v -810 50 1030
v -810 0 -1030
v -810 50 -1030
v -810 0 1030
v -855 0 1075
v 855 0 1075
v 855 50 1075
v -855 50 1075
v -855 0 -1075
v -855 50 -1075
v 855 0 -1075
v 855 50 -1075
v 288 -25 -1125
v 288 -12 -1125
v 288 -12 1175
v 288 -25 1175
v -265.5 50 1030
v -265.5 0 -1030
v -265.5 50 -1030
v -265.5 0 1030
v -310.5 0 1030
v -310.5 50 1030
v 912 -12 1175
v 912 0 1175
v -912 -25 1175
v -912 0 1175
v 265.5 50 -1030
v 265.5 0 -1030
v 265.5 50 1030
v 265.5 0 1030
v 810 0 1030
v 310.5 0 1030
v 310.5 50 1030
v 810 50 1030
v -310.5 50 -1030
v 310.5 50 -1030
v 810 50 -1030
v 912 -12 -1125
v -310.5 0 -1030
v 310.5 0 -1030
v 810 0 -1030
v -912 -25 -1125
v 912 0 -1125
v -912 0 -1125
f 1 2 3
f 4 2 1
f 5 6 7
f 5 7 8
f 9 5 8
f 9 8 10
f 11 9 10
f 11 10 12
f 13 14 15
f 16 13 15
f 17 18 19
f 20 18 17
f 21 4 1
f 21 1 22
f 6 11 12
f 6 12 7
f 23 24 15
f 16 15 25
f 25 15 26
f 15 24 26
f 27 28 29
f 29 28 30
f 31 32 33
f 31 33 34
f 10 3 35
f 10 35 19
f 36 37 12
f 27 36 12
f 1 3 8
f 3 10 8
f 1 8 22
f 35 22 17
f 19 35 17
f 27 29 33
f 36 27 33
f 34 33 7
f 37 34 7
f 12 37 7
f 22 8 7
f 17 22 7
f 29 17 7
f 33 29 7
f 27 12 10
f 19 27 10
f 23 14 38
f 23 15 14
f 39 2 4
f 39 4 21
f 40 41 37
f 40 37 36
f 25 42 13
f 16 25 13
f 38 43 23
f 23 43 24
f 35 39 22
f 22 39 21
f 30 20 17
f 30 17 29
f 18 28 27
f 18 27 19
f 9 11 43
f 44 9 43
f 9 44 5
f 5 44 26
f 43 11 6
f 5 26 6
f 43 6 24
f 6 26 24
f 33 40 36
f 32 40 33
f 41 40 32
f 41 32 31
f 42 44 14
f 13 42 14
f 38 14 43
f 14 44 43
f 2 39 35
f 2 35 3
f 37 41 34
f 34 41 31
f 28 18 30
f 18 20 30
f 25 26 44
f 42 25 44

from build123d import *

# Parameters (mm, degrees)
F0_W     = 45
F0_H     = 2060
F0_W_2   = 22.5
F1_DEPTH = 50
F0_W_3   = 499.5
F2_DEPTH = 12
F0_W_4   = 531
F3_DEPTH = 25


# Not quite as in the source:
# - a feature names something its author has since deleted; it is built from what else it names


with BuildPart() as f1:
    # F0 (on Front) → F1 (new body)
    with BuildSketch(Plane.XZ):
        with Locations((832.5, 0)):
            Rectangle(F0_W, F0_H)
        Polygon((288, -1075), (855, -1075), (855, -1030), (810, -1030), (310.5, -1030), (288, -1030), align=None)
        Polygon((-855, -1075), (288, -1075), (288, -1030), (265.5, -1030), (-265.5, -1030), (-310.5, -1030), (-810, -1030), (-855, -1030), align=None)
        with Locations((-832.5, 0)):
            Rectangle(F0_W, F0_H)
        with Locations((276.75, 0)):
            Rectangle(F0_W_2, F0_H)
        Polygon((810, 1030), (855, 1030), (855, 1075), (288, 1075), (288, 1030), (310.5, 1030), align=None)
        Polygon((265.5, 1030), (288, 1030), (288, 1075), (-855, 1075), (-855, 1030), (-810, 1030), (-310.5, 1030), (-265.5, 1030), align=None)
        with Locations((-288, 0)):
            Rectangle(F0_W, F0_H)
        with Locations((299.25, 0)):
            Rectangle(F0_W_2, F0_H)
    extrude(amount=-F1_DEPTH)

    # F0 (on Front) → F2 (join)
    with BuildSketch(Plane.XZ):
        Polygon((855, -1030), (855, -1075), (288, -1075), (288, -1125), (912, -1125), (912, 1175), (288, 1175), (288, 1075), (855, 1075), (855, 1030), align=None)
        with Locations((560.25, 0)):
            Rectangle(F0_W_3, F0_H)
        Polygon((288, -1075), (855, -1075), (855, -1030), (810, -1030), (310.5, -1030), (288, -1030), align=None)
        with Locations((832.5, 0)):
            Rectangle(F0_W, F0_H)
        Polygon((810, 1030), (855, 1030), (855, 1075), (288, 1075), (288, 1030), (310.5, 1030), align=None)
        with Locations((299.25, 0)):
            Rectangle(F0_W_2, F0_H)
    extrude(amount=F2_DEPTH)

    # F0 (on Front) → F3 (join)
    with BuildSketch(Plane.XZ):
        Polygon((288, -1125), (288, -1075), (-855, -1075), (-855, -1030), (-855, 1030), (-855, 1075), (288, 1075), (288, 1175), (-912, 1175), (-912, -1125), align=None)
        with Locations((-288, 0)):
            Rectangle(F0_W, F0_H)
        Polygon((265.5, 1030), (288, 1030), (288, 1075), (-855, 1075), (-855, 1030), (-810, 1030), (-310.5, 1030), (-265.5, 1030), align=None)
        with Locations((-832.5, 0)):
            Rectangle(F0_W, F0_H)
        with Locations((-560.25, 0)):
            Rectangle(F0_W_3, F0_H)
        Rectangle(F0_W_4, F0_H)
        Polygon((-855, -1075), (288, -1075), (288, -1030), (265.5, -1030), (-265.5, -1030), (-310.5, -1030), (-810, -1030), (-855, -1030), align=None)
        with Locations((276.75, 0)):
            Rectangle(F0_W_2, F0_H)
    extrude(amount=F3_DEPTH)


solid = f1.part
